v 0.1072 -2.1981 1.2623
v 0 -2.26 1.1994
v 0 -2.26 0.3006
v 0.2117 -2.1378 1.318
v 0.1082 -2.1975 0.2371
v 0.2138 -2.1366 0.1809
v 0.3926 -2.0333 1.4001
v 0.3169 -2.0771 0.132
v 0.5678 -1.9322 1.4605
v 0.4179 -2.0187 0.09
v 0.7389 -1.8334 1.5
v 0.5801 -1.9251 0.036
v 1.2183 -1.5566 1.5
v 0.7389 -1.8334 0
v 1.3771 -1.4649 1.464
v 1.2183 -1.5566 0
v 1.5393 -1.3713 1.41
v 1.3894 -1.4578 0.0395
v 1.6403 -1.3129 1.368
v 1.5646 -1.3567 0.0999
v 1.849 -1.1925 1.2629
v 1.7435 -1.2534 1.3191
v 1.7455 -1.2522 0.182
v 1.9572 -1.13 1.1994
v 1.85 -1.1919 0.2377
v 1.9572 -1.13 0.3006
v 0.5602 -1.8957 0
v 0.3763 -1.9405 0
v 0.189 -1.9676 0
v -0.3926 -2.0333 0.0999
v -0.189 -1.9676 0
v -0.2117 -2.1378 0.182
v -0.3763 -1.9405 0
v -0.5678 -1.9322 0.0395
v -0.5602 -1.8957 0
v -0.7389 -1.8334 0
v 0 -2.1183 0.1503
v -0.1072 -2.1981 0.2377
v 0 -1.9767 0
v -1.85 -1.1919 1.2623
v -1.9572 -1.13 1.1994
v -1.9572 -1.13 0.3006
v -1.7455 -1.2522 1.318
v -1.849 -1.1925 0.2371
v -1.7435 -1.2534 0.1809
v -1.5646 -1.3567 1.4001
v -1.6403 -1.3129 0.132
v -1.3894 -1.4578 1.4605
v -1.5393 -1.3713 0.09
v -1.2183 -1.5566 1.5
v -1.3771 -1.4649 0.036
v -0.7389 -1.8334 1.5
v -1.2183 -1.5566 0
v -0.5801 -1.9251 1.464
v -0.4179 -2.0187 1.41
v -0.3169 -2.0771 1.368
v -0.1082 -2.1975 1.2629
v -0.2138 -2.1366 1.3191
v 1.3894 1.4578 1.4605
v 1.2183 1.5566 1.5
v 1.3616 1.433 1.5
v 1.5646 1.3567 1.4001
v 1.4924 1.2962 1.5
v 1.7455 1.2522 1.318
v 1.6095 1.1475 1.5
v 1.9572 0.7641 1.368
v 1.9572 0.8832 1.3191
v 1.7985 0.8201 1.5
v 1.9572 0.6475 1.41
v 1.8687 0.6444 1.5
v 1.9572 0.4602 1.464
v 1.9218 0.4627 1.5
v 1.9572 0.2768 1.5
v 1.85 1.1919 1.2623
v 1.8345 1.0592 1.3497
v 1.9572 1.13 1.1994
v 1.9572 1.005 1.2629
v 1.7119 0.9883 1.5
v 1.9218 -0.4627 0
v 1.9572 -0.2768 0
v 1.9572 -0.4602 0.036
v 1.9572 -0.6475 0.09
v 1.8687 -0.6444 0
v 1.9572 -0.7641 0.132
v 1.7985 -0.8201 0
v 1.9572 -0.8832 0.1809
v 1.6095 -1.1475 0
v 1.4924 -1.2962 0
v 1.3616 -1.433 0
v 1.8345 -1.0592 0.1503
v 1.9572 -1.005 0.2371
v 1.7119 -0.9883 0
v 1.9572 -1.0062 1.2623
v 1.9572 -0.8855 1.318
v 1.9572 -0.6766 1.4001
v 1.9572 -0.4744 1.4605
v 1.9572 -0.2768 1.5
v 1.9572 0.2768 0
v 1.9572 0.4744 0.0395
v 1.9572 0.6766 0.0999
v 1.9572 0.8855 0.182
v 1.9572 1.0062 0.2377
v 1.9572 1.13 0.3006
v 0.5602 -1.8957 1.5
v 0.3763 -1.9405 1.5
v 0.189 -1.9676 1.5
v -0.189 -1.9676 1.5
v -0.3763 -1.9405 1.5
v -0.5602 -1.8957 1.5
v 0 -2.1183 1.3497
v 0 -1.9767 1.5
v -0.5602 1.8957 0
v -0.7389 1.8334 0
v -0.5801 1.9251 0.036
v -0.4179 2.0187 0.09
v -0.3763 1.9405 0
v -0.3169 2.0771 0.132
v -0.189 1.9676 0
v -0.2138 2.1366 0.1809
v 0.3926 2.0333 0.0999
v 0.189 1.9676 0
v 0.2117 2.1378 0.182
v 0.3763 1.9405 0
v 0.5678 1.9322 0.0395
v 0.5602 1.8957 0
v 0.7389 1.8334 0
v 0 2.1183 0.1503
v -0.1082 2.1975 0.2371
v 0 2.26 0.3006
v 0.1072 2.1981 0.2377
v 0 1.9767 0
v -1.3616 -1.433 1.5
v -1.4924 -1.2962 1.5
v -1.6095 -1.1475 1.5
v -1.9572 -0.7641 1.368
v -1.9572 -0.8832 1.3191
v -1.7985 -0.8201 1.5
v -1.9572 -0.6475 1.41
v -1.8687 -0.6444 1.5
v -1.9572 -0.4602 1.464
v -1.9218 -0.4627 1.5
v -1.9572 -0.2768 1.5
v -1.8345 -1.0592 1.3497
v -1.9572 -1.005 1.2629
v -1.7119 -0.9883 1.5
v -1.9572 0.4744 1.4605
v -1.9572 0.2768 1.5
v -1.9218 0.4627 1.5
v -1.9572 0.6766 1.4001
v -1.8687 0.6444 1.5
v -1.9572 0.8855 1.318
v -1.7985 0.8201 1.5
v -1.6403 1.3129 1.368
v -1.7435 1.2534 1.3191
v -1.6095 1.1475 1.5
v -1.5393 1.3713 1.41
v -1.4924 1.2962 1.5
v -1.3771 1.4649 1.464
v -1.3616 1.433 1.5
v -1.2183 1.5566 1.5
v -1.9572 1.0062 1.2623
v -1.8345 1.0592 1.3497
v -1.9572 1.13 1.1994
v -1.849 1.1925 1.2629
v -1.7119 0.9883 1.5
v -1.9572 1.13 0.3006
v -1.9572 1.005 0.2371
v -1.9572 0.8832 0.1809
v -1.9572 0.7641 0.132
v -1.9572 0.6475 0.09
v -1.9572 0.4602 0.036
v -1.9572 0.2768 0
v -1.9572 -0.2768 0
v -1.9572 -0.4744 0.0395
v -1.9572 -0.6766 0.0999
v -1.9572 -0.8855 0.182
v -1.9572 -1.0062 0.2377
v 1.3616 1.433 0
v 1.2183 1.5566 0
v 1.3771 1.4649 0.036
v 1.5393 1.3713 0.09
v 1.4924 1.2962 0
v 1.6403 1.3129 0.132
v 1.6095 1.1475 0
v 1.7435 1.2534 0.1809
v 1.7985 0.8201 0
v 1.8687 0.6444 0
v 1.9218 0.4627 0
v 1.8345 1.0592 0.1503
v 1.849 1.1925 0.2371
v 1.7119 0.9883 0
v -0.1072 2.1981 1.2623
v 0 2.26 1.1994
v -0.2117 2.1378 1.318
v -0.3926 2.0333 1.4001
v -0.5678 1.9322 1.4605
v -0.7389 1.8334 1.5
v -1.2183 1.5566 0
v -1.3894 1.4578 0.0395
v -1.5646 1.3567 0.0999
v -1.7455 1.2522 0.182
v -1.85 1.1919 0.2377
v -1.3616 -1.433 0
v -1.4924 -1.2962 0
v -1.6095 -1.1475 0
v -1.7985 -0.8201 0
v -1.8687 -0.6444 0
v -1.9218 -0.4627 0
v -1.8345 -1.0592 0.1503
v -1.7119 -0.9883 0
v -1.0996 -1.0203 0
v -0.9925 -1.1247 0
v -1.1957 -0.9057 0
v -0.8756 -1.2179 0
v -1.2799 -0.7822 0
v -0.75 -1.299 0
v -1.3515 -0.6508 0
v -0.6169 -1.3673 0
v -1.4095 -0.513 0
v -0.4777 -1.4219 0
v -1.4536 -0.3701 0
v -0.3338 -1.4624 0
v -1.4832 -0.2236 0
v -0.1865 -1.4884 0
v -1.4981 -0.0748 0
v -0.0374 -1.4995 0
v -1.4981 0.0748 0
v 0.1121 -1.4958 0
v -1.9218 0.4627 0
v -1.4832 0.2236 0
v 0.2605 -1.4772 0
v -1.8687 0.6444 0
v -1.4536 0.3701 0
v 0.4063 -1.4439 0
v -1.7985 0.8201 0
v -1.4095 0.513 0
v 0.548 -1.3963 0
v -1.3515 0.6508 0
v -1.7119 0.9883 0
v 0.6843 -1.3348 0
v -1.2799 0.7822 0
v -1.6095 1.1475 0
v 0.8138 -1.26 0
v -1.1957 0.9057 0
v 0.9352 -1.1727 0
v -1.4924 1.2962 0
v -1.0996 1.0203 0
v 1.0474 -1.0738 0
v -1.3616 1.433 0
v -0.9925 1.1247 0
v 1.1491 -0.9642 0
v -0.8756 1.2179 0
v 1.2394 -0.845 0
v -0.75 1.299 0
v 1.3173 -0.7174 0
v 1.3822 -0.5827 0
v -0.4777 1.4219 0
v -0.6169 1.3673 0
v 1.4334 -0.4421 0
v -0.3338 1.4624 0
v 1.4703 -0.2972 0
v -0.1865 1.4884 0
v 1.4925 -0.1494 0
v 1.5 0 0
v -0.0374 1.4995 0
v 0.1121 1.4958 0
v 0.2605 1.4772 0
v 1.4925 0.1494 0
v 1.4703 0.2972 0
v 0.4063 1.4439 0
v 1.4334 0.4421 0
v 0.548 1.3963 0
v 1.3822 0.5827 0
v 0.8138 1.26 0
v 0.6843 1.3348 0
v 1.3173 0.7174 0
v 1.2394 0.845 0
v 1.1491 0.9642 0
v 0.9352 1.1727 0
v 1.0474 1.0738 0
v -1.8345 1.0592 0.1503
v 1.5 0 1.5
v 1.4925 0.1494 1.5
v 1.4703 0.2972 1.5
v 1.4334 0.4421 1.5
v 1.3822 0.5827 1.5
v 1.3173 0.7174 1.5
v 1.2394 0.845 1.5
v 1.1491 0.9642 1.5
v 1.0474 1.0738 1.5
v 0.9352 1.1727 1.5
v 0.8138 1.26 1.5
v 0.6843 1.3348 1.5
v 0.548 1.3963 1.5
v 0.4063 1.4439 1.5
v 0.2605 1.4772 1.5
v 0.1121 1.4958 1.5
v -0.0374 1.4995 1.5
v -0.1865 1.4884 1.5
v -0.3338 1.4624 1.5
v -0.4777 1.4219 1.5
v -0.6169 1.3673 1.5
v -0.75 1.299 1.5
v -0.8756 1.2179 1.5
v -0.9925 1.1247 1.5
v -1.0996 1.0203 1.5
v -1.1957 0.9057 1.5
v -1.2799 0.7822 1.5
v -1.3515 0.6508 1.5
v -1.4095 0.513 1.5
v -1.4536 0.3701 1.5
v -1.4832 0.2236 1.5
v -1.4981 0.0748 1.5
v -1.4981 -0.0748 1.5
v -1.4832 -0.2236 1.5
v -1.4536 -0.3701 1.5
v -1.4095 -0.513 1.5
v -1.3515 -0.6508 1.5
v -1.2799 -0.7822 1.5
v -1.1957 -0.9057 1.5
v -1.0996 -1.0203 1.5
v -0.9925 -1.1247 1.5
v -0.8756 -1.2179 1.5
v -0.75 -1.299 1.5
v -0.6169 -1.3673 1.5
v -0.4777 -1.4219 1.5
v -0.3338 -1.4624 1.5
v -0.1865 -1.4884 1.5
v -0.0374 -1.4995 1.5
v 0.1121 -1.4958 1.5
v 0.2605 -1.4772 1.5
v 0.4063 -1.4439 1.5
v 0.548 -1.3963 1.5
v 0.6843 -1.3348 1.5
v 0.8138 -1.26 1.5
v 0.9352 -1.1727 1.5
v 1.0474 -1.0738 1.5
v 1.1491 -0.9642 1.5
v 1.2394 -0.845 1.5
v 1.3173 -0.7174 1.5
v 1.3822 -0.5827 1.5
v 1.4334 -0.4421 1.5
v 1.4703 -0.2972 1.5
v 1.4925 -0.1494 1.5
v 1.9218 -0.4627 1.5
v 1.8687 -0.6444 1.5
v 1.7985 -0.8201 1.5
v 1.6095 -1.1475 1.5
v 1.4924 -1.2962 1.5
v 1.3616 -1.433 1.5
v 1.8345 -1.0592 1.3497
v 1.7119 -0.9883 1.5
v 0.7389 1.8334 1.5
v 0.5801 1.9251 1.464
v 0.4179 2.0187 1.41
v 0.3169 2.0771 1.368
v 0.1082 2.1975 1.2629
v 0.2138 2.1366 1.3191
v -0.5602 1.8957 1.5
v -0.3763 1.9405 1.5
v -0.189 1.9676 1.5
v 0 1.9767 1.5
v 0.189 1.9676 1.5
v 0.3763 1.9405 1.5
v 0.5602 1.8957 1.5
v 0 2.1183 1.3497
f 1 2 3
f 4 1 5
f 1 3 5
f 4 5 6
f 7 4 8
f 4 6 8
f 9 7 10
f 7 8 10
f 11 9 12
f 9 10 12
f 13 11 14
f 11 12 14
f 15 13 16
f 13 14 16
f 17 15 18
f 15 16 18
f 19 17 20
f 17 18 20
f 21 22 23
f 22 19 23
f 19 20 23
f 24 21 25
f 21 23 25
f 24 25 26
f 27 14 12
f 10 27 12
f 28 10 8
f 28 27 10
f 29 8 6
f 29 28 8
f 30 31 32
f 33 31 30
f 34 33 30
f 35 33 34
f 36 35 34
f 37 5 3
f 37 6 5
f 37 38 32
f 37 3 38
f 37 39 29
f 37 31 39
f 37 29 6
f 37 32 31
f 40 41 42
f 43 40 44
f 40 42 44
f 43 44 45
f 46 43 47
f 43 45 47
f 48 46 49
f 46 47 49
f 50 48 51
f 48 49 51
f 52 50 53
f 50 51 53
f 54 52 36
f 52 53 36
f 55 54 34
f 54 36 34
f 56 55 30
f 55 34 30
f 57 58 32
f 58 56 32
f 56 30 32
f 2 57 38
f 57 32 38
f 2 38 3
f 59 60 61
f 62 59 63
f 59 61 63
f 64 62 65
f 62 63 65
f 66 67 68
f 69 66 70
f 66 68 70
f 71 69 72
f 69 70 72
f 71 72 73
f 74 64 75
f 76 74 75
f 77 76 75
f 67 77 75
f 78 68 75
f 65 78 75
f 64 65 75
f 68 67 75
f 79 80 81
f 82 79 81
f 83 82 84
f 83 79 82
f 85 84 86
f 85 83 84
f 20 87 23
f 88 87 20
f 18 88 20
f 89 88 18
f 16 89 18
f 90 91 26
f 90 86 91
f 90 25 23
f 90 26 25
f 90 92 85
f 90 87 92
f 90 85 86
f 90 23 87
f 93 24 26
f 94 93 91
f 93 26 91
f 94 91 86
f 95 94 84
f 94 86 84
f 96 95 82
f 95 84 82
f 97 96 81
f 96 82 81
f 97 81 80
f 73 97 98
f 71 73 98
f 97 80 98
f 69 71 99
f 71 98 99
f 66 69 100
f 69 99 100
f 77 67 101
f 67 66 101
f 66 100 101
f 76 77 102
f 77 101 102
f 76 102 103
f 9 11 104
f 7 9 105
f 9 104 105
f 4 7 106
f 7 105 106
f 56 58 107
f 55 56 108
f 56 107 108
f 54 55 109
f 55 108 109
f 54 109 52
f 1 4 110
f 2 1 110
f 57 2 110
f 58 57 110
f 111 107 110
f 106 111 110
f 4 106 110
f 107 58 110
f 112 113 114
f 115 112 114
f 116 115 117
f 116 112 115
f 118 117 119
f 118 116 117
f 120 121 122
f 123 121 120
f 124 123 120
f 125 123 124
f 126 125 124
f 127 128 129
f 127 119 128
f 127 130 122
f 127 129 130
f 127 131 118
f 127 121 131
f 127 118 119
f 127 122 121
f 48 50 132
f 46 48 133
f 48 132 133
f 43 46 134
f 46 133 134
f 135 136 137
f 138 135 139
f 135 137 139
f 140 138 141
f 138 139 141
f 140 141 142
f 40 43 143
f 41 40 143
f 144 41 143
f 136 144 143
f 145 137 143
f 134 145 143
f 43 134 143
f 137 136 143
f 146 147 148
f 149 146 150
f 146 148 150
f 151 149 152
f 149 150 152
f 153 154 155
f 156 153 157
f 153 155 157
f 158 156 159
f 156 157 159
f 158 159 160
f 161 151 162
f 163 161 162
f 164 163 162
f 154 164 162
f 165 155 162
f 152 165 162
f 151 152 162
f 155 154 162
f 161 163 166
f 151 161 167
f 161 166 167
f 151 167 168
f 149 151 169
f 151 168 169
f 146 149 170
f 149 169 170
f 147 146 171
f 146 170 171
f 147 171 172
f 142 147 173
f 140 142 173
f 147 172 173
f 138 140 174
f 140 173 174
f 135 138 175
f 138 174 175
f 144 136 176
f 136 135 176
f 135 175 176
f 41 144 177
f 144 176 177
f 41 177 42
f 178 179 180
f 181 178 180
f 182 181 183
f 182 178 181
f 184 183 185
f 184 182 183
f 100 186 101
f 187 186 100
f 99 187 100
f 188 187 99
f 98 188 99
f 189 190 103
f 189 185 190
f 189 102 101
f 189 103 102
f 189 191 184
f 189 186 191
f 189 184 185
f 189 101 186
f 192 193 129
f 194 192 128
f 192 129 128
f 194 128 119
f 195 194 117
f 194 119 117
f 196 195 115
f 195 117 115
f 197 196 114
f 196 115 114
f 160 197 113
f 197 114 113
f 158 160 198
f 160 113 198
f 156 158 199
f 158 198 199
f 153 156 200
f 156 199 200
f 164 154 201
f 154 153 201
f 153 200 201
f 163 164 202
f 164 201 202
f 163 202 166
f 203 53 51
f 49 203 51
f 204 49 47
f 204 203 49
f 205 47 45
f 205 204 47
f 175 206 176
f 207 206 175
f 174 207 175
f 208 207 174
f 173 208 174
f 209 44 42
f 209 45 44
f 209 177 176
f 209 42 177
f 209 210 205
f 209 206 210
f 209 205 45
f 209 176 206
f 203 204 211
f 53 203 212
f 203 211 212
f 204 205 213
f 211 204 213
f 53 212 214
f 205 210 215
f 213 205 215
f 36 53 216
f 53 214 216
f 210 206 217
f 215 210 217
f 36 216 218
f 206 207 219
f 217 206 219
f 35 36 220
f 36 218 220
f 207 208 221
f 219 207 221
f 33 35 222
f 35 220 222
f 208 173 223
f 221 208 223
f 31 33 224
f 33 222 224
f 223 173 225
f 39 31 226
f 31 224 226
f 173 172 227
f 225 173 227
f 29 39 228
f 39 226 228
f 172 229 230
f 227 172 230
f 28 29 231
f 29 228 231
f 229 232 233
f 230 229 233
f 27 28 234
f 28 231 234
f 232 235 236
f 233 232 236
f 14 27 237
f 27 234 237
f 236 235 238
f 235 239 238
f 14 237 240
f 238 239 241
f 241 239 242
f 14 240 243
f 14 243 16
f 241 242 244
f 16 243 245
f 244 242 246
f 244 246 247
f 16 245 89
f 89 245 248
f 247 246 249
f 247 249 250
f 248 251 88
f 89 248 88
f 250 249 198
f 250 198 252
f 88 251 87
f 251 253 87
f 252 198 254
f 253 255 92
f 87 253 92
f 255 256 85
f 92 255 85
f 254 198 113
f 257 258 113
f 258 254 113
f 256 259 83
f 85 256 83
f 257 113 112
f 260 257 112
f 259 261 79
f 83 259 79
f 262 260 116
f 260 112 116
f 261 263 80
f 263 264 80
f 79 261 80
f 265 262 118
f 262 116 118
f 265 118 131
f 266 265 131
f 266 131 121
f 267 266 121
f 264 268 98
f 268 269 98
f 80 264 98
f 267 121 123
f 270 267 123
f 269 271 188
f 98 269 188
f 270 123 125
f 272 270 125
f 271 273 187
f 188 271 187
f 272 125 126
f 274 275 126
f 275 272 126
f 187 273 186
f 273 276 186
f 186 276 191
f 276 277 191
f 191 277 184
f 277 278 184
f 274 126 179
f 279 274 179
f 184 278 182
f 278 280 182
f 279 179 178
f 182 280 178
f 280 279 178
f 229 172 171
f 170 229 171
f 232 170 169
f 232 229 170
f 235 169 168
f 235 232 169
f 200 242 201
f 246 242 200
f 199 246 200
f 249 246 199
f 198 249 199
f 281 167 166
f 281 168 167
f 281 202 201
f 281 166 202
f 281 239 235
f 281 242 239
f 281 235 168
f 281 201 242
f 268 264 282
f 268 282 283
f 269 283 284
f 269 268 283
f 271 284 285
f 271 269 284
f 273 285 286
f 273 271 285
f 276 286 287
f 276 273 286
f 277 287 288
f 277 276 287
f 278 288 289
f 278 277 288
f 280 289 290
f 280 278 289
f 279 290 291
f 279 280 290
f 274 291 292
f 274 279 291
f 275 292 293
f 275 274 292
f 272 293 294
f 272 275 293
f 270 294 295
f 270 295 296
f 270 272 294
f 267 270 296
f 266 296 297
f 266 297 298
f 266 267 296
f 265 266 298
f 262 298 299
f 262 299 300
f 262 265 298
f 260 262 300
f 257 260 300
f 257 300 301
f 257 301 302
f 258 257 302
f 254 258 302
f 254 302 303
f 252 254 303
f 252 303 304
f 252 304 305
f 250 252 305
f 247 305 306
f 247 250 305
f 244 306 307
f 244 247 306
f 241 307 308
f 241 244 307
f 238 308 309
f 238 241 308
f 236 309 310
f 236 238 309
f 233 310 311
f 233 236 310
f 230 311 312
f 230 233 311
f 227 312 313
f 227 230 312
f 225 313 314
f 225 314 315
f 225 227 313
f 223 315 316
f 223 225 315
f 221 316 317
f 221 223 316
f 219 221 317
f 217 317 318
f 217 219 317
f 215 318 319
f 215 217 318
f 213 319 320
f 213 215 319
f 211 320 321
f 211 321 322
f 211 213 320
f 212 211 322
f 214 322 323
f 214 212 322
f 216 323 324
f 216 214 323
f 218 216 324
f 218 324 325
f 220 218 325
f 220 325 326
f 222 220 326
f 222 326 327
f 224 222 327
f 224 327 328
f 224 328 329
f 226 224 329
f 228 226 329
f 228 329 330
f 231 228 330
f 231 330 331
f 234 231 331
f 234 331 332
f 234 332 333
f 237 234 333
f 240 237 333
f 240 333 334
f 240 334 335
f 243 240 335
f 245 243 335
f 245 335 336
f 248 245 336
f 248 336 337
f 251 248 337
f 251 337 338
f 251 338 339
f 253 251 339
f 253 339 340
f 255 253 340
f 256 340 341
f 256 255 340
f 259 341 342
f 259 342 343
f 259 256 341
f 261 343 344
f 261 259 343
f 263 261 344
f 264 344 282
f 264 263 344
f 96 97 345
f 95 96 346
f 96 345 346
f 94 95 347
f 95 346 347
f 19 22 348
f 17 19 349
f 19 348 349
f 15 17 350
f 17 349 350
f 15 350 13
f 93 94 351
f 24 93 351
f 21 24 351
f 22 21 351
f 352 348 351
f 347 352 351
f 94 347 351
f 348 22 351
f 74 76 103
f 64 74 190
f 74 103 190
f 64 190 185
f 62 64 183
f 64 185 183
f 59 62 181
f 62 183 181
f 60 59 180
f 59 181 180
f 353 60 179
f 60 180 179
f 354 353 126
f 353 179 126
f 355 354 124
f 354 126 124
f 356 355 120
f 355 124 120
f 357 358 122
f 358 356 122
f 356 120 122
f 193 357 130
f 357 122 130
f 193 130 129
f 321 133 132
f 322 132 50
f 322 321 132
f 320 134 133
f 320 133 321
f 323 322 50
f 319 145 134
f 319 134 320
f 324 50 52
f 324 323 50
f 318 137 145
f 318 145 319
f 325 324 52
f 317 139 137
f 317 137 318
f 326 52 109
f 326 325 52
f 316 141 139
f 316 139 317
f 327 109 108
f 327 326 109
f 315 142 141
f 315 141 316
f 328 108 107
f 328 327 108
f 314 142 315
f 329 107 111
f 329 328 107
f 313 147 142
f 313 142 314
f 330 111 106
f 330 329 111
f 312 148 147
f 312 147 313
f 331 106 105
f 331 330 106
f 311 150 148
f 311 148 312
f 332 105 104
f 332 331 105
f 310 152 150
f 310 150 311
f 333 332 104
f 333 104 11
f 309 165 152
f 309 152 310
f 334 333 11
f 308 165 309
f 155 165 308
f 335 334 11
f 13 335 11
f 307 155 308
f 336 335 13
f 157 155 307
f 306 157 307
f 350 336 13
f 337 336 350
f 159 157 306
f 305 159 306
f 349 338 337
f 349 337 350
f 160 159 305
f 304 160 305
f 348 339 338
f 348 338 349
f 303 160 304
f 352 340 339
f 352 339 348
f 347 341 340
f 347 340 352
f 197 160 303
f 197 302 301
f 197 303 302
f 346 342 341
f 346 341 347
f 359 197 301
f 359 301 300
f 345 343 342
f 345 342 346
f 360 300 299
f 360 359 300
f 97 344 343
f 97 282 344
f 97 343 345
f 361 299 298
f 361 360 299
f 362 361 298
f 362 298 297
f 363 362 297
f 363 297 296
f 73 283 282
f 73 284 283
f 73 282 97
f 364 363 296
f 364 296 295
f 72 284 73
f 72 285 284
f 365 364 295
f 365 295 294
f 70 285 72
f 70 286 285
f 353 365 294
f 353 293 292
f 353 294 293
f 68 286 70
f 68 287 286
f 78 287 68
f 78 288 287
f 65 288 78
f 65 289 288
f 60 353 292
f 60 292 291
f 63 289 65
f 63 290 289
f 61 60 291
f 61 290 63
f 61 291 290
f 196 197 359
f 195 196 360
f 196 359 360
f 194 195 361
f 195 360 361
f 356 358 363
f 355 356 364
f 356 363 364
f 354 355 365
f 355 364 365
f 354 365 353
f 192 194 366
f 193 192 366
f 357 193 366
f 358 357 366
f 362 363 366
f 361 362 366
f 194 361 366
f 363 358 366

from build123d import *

# Parameters (mm, degrees)
SKETCH_1_R      = 1.5
EXTRUDE_1_DEPTH = 1.5


with BuildPart() as part:
    # 草图1 → 凸台-拉伸1 (new body)
    with BuildSketch(Plane.XY):
        Polygon((0, 2.259998291), (-1.957215932, 1.129999145), (-1.957215932, -1.129999145), (0, -2.259998291), (1.957215932, -1.129999145), (1.957215932, 1.129999145), align=None)
        Circle(SKETCH_1_R, mode=Mode.SUBTRACT)
    extrude(amount=EXTRUDE_1_DEPTH)

    # 草图2 → 切除-旋转1 (revolve, cut)
    with BuildSketch(Plane(origin=(0, 0, 0), x_dir=(0, 0, -1), z_dir=(1, 0, 0))):
        Polygon((-1.199430382, 2.259998291), (-1.569433195, 1.91124689), (-1.569433195, 2.384862388), (-1.189718912, 2.384862388), align=None)
    cut_revolve_1 = revolve(axis=Axis((0, 0, 1.5), (0, 0, -1)), mode=Mode.SUBTRACT)

    # 镜向1: 切除-旋转1 across plane
    add(cut_revolve_1.mirror(Plane(origin=(0, 0, 0.75), x_dir=(1, 0, 0), z_dir=(0, 0, -1))), mode=Mode.SUBTRACT)


solid = part.part
